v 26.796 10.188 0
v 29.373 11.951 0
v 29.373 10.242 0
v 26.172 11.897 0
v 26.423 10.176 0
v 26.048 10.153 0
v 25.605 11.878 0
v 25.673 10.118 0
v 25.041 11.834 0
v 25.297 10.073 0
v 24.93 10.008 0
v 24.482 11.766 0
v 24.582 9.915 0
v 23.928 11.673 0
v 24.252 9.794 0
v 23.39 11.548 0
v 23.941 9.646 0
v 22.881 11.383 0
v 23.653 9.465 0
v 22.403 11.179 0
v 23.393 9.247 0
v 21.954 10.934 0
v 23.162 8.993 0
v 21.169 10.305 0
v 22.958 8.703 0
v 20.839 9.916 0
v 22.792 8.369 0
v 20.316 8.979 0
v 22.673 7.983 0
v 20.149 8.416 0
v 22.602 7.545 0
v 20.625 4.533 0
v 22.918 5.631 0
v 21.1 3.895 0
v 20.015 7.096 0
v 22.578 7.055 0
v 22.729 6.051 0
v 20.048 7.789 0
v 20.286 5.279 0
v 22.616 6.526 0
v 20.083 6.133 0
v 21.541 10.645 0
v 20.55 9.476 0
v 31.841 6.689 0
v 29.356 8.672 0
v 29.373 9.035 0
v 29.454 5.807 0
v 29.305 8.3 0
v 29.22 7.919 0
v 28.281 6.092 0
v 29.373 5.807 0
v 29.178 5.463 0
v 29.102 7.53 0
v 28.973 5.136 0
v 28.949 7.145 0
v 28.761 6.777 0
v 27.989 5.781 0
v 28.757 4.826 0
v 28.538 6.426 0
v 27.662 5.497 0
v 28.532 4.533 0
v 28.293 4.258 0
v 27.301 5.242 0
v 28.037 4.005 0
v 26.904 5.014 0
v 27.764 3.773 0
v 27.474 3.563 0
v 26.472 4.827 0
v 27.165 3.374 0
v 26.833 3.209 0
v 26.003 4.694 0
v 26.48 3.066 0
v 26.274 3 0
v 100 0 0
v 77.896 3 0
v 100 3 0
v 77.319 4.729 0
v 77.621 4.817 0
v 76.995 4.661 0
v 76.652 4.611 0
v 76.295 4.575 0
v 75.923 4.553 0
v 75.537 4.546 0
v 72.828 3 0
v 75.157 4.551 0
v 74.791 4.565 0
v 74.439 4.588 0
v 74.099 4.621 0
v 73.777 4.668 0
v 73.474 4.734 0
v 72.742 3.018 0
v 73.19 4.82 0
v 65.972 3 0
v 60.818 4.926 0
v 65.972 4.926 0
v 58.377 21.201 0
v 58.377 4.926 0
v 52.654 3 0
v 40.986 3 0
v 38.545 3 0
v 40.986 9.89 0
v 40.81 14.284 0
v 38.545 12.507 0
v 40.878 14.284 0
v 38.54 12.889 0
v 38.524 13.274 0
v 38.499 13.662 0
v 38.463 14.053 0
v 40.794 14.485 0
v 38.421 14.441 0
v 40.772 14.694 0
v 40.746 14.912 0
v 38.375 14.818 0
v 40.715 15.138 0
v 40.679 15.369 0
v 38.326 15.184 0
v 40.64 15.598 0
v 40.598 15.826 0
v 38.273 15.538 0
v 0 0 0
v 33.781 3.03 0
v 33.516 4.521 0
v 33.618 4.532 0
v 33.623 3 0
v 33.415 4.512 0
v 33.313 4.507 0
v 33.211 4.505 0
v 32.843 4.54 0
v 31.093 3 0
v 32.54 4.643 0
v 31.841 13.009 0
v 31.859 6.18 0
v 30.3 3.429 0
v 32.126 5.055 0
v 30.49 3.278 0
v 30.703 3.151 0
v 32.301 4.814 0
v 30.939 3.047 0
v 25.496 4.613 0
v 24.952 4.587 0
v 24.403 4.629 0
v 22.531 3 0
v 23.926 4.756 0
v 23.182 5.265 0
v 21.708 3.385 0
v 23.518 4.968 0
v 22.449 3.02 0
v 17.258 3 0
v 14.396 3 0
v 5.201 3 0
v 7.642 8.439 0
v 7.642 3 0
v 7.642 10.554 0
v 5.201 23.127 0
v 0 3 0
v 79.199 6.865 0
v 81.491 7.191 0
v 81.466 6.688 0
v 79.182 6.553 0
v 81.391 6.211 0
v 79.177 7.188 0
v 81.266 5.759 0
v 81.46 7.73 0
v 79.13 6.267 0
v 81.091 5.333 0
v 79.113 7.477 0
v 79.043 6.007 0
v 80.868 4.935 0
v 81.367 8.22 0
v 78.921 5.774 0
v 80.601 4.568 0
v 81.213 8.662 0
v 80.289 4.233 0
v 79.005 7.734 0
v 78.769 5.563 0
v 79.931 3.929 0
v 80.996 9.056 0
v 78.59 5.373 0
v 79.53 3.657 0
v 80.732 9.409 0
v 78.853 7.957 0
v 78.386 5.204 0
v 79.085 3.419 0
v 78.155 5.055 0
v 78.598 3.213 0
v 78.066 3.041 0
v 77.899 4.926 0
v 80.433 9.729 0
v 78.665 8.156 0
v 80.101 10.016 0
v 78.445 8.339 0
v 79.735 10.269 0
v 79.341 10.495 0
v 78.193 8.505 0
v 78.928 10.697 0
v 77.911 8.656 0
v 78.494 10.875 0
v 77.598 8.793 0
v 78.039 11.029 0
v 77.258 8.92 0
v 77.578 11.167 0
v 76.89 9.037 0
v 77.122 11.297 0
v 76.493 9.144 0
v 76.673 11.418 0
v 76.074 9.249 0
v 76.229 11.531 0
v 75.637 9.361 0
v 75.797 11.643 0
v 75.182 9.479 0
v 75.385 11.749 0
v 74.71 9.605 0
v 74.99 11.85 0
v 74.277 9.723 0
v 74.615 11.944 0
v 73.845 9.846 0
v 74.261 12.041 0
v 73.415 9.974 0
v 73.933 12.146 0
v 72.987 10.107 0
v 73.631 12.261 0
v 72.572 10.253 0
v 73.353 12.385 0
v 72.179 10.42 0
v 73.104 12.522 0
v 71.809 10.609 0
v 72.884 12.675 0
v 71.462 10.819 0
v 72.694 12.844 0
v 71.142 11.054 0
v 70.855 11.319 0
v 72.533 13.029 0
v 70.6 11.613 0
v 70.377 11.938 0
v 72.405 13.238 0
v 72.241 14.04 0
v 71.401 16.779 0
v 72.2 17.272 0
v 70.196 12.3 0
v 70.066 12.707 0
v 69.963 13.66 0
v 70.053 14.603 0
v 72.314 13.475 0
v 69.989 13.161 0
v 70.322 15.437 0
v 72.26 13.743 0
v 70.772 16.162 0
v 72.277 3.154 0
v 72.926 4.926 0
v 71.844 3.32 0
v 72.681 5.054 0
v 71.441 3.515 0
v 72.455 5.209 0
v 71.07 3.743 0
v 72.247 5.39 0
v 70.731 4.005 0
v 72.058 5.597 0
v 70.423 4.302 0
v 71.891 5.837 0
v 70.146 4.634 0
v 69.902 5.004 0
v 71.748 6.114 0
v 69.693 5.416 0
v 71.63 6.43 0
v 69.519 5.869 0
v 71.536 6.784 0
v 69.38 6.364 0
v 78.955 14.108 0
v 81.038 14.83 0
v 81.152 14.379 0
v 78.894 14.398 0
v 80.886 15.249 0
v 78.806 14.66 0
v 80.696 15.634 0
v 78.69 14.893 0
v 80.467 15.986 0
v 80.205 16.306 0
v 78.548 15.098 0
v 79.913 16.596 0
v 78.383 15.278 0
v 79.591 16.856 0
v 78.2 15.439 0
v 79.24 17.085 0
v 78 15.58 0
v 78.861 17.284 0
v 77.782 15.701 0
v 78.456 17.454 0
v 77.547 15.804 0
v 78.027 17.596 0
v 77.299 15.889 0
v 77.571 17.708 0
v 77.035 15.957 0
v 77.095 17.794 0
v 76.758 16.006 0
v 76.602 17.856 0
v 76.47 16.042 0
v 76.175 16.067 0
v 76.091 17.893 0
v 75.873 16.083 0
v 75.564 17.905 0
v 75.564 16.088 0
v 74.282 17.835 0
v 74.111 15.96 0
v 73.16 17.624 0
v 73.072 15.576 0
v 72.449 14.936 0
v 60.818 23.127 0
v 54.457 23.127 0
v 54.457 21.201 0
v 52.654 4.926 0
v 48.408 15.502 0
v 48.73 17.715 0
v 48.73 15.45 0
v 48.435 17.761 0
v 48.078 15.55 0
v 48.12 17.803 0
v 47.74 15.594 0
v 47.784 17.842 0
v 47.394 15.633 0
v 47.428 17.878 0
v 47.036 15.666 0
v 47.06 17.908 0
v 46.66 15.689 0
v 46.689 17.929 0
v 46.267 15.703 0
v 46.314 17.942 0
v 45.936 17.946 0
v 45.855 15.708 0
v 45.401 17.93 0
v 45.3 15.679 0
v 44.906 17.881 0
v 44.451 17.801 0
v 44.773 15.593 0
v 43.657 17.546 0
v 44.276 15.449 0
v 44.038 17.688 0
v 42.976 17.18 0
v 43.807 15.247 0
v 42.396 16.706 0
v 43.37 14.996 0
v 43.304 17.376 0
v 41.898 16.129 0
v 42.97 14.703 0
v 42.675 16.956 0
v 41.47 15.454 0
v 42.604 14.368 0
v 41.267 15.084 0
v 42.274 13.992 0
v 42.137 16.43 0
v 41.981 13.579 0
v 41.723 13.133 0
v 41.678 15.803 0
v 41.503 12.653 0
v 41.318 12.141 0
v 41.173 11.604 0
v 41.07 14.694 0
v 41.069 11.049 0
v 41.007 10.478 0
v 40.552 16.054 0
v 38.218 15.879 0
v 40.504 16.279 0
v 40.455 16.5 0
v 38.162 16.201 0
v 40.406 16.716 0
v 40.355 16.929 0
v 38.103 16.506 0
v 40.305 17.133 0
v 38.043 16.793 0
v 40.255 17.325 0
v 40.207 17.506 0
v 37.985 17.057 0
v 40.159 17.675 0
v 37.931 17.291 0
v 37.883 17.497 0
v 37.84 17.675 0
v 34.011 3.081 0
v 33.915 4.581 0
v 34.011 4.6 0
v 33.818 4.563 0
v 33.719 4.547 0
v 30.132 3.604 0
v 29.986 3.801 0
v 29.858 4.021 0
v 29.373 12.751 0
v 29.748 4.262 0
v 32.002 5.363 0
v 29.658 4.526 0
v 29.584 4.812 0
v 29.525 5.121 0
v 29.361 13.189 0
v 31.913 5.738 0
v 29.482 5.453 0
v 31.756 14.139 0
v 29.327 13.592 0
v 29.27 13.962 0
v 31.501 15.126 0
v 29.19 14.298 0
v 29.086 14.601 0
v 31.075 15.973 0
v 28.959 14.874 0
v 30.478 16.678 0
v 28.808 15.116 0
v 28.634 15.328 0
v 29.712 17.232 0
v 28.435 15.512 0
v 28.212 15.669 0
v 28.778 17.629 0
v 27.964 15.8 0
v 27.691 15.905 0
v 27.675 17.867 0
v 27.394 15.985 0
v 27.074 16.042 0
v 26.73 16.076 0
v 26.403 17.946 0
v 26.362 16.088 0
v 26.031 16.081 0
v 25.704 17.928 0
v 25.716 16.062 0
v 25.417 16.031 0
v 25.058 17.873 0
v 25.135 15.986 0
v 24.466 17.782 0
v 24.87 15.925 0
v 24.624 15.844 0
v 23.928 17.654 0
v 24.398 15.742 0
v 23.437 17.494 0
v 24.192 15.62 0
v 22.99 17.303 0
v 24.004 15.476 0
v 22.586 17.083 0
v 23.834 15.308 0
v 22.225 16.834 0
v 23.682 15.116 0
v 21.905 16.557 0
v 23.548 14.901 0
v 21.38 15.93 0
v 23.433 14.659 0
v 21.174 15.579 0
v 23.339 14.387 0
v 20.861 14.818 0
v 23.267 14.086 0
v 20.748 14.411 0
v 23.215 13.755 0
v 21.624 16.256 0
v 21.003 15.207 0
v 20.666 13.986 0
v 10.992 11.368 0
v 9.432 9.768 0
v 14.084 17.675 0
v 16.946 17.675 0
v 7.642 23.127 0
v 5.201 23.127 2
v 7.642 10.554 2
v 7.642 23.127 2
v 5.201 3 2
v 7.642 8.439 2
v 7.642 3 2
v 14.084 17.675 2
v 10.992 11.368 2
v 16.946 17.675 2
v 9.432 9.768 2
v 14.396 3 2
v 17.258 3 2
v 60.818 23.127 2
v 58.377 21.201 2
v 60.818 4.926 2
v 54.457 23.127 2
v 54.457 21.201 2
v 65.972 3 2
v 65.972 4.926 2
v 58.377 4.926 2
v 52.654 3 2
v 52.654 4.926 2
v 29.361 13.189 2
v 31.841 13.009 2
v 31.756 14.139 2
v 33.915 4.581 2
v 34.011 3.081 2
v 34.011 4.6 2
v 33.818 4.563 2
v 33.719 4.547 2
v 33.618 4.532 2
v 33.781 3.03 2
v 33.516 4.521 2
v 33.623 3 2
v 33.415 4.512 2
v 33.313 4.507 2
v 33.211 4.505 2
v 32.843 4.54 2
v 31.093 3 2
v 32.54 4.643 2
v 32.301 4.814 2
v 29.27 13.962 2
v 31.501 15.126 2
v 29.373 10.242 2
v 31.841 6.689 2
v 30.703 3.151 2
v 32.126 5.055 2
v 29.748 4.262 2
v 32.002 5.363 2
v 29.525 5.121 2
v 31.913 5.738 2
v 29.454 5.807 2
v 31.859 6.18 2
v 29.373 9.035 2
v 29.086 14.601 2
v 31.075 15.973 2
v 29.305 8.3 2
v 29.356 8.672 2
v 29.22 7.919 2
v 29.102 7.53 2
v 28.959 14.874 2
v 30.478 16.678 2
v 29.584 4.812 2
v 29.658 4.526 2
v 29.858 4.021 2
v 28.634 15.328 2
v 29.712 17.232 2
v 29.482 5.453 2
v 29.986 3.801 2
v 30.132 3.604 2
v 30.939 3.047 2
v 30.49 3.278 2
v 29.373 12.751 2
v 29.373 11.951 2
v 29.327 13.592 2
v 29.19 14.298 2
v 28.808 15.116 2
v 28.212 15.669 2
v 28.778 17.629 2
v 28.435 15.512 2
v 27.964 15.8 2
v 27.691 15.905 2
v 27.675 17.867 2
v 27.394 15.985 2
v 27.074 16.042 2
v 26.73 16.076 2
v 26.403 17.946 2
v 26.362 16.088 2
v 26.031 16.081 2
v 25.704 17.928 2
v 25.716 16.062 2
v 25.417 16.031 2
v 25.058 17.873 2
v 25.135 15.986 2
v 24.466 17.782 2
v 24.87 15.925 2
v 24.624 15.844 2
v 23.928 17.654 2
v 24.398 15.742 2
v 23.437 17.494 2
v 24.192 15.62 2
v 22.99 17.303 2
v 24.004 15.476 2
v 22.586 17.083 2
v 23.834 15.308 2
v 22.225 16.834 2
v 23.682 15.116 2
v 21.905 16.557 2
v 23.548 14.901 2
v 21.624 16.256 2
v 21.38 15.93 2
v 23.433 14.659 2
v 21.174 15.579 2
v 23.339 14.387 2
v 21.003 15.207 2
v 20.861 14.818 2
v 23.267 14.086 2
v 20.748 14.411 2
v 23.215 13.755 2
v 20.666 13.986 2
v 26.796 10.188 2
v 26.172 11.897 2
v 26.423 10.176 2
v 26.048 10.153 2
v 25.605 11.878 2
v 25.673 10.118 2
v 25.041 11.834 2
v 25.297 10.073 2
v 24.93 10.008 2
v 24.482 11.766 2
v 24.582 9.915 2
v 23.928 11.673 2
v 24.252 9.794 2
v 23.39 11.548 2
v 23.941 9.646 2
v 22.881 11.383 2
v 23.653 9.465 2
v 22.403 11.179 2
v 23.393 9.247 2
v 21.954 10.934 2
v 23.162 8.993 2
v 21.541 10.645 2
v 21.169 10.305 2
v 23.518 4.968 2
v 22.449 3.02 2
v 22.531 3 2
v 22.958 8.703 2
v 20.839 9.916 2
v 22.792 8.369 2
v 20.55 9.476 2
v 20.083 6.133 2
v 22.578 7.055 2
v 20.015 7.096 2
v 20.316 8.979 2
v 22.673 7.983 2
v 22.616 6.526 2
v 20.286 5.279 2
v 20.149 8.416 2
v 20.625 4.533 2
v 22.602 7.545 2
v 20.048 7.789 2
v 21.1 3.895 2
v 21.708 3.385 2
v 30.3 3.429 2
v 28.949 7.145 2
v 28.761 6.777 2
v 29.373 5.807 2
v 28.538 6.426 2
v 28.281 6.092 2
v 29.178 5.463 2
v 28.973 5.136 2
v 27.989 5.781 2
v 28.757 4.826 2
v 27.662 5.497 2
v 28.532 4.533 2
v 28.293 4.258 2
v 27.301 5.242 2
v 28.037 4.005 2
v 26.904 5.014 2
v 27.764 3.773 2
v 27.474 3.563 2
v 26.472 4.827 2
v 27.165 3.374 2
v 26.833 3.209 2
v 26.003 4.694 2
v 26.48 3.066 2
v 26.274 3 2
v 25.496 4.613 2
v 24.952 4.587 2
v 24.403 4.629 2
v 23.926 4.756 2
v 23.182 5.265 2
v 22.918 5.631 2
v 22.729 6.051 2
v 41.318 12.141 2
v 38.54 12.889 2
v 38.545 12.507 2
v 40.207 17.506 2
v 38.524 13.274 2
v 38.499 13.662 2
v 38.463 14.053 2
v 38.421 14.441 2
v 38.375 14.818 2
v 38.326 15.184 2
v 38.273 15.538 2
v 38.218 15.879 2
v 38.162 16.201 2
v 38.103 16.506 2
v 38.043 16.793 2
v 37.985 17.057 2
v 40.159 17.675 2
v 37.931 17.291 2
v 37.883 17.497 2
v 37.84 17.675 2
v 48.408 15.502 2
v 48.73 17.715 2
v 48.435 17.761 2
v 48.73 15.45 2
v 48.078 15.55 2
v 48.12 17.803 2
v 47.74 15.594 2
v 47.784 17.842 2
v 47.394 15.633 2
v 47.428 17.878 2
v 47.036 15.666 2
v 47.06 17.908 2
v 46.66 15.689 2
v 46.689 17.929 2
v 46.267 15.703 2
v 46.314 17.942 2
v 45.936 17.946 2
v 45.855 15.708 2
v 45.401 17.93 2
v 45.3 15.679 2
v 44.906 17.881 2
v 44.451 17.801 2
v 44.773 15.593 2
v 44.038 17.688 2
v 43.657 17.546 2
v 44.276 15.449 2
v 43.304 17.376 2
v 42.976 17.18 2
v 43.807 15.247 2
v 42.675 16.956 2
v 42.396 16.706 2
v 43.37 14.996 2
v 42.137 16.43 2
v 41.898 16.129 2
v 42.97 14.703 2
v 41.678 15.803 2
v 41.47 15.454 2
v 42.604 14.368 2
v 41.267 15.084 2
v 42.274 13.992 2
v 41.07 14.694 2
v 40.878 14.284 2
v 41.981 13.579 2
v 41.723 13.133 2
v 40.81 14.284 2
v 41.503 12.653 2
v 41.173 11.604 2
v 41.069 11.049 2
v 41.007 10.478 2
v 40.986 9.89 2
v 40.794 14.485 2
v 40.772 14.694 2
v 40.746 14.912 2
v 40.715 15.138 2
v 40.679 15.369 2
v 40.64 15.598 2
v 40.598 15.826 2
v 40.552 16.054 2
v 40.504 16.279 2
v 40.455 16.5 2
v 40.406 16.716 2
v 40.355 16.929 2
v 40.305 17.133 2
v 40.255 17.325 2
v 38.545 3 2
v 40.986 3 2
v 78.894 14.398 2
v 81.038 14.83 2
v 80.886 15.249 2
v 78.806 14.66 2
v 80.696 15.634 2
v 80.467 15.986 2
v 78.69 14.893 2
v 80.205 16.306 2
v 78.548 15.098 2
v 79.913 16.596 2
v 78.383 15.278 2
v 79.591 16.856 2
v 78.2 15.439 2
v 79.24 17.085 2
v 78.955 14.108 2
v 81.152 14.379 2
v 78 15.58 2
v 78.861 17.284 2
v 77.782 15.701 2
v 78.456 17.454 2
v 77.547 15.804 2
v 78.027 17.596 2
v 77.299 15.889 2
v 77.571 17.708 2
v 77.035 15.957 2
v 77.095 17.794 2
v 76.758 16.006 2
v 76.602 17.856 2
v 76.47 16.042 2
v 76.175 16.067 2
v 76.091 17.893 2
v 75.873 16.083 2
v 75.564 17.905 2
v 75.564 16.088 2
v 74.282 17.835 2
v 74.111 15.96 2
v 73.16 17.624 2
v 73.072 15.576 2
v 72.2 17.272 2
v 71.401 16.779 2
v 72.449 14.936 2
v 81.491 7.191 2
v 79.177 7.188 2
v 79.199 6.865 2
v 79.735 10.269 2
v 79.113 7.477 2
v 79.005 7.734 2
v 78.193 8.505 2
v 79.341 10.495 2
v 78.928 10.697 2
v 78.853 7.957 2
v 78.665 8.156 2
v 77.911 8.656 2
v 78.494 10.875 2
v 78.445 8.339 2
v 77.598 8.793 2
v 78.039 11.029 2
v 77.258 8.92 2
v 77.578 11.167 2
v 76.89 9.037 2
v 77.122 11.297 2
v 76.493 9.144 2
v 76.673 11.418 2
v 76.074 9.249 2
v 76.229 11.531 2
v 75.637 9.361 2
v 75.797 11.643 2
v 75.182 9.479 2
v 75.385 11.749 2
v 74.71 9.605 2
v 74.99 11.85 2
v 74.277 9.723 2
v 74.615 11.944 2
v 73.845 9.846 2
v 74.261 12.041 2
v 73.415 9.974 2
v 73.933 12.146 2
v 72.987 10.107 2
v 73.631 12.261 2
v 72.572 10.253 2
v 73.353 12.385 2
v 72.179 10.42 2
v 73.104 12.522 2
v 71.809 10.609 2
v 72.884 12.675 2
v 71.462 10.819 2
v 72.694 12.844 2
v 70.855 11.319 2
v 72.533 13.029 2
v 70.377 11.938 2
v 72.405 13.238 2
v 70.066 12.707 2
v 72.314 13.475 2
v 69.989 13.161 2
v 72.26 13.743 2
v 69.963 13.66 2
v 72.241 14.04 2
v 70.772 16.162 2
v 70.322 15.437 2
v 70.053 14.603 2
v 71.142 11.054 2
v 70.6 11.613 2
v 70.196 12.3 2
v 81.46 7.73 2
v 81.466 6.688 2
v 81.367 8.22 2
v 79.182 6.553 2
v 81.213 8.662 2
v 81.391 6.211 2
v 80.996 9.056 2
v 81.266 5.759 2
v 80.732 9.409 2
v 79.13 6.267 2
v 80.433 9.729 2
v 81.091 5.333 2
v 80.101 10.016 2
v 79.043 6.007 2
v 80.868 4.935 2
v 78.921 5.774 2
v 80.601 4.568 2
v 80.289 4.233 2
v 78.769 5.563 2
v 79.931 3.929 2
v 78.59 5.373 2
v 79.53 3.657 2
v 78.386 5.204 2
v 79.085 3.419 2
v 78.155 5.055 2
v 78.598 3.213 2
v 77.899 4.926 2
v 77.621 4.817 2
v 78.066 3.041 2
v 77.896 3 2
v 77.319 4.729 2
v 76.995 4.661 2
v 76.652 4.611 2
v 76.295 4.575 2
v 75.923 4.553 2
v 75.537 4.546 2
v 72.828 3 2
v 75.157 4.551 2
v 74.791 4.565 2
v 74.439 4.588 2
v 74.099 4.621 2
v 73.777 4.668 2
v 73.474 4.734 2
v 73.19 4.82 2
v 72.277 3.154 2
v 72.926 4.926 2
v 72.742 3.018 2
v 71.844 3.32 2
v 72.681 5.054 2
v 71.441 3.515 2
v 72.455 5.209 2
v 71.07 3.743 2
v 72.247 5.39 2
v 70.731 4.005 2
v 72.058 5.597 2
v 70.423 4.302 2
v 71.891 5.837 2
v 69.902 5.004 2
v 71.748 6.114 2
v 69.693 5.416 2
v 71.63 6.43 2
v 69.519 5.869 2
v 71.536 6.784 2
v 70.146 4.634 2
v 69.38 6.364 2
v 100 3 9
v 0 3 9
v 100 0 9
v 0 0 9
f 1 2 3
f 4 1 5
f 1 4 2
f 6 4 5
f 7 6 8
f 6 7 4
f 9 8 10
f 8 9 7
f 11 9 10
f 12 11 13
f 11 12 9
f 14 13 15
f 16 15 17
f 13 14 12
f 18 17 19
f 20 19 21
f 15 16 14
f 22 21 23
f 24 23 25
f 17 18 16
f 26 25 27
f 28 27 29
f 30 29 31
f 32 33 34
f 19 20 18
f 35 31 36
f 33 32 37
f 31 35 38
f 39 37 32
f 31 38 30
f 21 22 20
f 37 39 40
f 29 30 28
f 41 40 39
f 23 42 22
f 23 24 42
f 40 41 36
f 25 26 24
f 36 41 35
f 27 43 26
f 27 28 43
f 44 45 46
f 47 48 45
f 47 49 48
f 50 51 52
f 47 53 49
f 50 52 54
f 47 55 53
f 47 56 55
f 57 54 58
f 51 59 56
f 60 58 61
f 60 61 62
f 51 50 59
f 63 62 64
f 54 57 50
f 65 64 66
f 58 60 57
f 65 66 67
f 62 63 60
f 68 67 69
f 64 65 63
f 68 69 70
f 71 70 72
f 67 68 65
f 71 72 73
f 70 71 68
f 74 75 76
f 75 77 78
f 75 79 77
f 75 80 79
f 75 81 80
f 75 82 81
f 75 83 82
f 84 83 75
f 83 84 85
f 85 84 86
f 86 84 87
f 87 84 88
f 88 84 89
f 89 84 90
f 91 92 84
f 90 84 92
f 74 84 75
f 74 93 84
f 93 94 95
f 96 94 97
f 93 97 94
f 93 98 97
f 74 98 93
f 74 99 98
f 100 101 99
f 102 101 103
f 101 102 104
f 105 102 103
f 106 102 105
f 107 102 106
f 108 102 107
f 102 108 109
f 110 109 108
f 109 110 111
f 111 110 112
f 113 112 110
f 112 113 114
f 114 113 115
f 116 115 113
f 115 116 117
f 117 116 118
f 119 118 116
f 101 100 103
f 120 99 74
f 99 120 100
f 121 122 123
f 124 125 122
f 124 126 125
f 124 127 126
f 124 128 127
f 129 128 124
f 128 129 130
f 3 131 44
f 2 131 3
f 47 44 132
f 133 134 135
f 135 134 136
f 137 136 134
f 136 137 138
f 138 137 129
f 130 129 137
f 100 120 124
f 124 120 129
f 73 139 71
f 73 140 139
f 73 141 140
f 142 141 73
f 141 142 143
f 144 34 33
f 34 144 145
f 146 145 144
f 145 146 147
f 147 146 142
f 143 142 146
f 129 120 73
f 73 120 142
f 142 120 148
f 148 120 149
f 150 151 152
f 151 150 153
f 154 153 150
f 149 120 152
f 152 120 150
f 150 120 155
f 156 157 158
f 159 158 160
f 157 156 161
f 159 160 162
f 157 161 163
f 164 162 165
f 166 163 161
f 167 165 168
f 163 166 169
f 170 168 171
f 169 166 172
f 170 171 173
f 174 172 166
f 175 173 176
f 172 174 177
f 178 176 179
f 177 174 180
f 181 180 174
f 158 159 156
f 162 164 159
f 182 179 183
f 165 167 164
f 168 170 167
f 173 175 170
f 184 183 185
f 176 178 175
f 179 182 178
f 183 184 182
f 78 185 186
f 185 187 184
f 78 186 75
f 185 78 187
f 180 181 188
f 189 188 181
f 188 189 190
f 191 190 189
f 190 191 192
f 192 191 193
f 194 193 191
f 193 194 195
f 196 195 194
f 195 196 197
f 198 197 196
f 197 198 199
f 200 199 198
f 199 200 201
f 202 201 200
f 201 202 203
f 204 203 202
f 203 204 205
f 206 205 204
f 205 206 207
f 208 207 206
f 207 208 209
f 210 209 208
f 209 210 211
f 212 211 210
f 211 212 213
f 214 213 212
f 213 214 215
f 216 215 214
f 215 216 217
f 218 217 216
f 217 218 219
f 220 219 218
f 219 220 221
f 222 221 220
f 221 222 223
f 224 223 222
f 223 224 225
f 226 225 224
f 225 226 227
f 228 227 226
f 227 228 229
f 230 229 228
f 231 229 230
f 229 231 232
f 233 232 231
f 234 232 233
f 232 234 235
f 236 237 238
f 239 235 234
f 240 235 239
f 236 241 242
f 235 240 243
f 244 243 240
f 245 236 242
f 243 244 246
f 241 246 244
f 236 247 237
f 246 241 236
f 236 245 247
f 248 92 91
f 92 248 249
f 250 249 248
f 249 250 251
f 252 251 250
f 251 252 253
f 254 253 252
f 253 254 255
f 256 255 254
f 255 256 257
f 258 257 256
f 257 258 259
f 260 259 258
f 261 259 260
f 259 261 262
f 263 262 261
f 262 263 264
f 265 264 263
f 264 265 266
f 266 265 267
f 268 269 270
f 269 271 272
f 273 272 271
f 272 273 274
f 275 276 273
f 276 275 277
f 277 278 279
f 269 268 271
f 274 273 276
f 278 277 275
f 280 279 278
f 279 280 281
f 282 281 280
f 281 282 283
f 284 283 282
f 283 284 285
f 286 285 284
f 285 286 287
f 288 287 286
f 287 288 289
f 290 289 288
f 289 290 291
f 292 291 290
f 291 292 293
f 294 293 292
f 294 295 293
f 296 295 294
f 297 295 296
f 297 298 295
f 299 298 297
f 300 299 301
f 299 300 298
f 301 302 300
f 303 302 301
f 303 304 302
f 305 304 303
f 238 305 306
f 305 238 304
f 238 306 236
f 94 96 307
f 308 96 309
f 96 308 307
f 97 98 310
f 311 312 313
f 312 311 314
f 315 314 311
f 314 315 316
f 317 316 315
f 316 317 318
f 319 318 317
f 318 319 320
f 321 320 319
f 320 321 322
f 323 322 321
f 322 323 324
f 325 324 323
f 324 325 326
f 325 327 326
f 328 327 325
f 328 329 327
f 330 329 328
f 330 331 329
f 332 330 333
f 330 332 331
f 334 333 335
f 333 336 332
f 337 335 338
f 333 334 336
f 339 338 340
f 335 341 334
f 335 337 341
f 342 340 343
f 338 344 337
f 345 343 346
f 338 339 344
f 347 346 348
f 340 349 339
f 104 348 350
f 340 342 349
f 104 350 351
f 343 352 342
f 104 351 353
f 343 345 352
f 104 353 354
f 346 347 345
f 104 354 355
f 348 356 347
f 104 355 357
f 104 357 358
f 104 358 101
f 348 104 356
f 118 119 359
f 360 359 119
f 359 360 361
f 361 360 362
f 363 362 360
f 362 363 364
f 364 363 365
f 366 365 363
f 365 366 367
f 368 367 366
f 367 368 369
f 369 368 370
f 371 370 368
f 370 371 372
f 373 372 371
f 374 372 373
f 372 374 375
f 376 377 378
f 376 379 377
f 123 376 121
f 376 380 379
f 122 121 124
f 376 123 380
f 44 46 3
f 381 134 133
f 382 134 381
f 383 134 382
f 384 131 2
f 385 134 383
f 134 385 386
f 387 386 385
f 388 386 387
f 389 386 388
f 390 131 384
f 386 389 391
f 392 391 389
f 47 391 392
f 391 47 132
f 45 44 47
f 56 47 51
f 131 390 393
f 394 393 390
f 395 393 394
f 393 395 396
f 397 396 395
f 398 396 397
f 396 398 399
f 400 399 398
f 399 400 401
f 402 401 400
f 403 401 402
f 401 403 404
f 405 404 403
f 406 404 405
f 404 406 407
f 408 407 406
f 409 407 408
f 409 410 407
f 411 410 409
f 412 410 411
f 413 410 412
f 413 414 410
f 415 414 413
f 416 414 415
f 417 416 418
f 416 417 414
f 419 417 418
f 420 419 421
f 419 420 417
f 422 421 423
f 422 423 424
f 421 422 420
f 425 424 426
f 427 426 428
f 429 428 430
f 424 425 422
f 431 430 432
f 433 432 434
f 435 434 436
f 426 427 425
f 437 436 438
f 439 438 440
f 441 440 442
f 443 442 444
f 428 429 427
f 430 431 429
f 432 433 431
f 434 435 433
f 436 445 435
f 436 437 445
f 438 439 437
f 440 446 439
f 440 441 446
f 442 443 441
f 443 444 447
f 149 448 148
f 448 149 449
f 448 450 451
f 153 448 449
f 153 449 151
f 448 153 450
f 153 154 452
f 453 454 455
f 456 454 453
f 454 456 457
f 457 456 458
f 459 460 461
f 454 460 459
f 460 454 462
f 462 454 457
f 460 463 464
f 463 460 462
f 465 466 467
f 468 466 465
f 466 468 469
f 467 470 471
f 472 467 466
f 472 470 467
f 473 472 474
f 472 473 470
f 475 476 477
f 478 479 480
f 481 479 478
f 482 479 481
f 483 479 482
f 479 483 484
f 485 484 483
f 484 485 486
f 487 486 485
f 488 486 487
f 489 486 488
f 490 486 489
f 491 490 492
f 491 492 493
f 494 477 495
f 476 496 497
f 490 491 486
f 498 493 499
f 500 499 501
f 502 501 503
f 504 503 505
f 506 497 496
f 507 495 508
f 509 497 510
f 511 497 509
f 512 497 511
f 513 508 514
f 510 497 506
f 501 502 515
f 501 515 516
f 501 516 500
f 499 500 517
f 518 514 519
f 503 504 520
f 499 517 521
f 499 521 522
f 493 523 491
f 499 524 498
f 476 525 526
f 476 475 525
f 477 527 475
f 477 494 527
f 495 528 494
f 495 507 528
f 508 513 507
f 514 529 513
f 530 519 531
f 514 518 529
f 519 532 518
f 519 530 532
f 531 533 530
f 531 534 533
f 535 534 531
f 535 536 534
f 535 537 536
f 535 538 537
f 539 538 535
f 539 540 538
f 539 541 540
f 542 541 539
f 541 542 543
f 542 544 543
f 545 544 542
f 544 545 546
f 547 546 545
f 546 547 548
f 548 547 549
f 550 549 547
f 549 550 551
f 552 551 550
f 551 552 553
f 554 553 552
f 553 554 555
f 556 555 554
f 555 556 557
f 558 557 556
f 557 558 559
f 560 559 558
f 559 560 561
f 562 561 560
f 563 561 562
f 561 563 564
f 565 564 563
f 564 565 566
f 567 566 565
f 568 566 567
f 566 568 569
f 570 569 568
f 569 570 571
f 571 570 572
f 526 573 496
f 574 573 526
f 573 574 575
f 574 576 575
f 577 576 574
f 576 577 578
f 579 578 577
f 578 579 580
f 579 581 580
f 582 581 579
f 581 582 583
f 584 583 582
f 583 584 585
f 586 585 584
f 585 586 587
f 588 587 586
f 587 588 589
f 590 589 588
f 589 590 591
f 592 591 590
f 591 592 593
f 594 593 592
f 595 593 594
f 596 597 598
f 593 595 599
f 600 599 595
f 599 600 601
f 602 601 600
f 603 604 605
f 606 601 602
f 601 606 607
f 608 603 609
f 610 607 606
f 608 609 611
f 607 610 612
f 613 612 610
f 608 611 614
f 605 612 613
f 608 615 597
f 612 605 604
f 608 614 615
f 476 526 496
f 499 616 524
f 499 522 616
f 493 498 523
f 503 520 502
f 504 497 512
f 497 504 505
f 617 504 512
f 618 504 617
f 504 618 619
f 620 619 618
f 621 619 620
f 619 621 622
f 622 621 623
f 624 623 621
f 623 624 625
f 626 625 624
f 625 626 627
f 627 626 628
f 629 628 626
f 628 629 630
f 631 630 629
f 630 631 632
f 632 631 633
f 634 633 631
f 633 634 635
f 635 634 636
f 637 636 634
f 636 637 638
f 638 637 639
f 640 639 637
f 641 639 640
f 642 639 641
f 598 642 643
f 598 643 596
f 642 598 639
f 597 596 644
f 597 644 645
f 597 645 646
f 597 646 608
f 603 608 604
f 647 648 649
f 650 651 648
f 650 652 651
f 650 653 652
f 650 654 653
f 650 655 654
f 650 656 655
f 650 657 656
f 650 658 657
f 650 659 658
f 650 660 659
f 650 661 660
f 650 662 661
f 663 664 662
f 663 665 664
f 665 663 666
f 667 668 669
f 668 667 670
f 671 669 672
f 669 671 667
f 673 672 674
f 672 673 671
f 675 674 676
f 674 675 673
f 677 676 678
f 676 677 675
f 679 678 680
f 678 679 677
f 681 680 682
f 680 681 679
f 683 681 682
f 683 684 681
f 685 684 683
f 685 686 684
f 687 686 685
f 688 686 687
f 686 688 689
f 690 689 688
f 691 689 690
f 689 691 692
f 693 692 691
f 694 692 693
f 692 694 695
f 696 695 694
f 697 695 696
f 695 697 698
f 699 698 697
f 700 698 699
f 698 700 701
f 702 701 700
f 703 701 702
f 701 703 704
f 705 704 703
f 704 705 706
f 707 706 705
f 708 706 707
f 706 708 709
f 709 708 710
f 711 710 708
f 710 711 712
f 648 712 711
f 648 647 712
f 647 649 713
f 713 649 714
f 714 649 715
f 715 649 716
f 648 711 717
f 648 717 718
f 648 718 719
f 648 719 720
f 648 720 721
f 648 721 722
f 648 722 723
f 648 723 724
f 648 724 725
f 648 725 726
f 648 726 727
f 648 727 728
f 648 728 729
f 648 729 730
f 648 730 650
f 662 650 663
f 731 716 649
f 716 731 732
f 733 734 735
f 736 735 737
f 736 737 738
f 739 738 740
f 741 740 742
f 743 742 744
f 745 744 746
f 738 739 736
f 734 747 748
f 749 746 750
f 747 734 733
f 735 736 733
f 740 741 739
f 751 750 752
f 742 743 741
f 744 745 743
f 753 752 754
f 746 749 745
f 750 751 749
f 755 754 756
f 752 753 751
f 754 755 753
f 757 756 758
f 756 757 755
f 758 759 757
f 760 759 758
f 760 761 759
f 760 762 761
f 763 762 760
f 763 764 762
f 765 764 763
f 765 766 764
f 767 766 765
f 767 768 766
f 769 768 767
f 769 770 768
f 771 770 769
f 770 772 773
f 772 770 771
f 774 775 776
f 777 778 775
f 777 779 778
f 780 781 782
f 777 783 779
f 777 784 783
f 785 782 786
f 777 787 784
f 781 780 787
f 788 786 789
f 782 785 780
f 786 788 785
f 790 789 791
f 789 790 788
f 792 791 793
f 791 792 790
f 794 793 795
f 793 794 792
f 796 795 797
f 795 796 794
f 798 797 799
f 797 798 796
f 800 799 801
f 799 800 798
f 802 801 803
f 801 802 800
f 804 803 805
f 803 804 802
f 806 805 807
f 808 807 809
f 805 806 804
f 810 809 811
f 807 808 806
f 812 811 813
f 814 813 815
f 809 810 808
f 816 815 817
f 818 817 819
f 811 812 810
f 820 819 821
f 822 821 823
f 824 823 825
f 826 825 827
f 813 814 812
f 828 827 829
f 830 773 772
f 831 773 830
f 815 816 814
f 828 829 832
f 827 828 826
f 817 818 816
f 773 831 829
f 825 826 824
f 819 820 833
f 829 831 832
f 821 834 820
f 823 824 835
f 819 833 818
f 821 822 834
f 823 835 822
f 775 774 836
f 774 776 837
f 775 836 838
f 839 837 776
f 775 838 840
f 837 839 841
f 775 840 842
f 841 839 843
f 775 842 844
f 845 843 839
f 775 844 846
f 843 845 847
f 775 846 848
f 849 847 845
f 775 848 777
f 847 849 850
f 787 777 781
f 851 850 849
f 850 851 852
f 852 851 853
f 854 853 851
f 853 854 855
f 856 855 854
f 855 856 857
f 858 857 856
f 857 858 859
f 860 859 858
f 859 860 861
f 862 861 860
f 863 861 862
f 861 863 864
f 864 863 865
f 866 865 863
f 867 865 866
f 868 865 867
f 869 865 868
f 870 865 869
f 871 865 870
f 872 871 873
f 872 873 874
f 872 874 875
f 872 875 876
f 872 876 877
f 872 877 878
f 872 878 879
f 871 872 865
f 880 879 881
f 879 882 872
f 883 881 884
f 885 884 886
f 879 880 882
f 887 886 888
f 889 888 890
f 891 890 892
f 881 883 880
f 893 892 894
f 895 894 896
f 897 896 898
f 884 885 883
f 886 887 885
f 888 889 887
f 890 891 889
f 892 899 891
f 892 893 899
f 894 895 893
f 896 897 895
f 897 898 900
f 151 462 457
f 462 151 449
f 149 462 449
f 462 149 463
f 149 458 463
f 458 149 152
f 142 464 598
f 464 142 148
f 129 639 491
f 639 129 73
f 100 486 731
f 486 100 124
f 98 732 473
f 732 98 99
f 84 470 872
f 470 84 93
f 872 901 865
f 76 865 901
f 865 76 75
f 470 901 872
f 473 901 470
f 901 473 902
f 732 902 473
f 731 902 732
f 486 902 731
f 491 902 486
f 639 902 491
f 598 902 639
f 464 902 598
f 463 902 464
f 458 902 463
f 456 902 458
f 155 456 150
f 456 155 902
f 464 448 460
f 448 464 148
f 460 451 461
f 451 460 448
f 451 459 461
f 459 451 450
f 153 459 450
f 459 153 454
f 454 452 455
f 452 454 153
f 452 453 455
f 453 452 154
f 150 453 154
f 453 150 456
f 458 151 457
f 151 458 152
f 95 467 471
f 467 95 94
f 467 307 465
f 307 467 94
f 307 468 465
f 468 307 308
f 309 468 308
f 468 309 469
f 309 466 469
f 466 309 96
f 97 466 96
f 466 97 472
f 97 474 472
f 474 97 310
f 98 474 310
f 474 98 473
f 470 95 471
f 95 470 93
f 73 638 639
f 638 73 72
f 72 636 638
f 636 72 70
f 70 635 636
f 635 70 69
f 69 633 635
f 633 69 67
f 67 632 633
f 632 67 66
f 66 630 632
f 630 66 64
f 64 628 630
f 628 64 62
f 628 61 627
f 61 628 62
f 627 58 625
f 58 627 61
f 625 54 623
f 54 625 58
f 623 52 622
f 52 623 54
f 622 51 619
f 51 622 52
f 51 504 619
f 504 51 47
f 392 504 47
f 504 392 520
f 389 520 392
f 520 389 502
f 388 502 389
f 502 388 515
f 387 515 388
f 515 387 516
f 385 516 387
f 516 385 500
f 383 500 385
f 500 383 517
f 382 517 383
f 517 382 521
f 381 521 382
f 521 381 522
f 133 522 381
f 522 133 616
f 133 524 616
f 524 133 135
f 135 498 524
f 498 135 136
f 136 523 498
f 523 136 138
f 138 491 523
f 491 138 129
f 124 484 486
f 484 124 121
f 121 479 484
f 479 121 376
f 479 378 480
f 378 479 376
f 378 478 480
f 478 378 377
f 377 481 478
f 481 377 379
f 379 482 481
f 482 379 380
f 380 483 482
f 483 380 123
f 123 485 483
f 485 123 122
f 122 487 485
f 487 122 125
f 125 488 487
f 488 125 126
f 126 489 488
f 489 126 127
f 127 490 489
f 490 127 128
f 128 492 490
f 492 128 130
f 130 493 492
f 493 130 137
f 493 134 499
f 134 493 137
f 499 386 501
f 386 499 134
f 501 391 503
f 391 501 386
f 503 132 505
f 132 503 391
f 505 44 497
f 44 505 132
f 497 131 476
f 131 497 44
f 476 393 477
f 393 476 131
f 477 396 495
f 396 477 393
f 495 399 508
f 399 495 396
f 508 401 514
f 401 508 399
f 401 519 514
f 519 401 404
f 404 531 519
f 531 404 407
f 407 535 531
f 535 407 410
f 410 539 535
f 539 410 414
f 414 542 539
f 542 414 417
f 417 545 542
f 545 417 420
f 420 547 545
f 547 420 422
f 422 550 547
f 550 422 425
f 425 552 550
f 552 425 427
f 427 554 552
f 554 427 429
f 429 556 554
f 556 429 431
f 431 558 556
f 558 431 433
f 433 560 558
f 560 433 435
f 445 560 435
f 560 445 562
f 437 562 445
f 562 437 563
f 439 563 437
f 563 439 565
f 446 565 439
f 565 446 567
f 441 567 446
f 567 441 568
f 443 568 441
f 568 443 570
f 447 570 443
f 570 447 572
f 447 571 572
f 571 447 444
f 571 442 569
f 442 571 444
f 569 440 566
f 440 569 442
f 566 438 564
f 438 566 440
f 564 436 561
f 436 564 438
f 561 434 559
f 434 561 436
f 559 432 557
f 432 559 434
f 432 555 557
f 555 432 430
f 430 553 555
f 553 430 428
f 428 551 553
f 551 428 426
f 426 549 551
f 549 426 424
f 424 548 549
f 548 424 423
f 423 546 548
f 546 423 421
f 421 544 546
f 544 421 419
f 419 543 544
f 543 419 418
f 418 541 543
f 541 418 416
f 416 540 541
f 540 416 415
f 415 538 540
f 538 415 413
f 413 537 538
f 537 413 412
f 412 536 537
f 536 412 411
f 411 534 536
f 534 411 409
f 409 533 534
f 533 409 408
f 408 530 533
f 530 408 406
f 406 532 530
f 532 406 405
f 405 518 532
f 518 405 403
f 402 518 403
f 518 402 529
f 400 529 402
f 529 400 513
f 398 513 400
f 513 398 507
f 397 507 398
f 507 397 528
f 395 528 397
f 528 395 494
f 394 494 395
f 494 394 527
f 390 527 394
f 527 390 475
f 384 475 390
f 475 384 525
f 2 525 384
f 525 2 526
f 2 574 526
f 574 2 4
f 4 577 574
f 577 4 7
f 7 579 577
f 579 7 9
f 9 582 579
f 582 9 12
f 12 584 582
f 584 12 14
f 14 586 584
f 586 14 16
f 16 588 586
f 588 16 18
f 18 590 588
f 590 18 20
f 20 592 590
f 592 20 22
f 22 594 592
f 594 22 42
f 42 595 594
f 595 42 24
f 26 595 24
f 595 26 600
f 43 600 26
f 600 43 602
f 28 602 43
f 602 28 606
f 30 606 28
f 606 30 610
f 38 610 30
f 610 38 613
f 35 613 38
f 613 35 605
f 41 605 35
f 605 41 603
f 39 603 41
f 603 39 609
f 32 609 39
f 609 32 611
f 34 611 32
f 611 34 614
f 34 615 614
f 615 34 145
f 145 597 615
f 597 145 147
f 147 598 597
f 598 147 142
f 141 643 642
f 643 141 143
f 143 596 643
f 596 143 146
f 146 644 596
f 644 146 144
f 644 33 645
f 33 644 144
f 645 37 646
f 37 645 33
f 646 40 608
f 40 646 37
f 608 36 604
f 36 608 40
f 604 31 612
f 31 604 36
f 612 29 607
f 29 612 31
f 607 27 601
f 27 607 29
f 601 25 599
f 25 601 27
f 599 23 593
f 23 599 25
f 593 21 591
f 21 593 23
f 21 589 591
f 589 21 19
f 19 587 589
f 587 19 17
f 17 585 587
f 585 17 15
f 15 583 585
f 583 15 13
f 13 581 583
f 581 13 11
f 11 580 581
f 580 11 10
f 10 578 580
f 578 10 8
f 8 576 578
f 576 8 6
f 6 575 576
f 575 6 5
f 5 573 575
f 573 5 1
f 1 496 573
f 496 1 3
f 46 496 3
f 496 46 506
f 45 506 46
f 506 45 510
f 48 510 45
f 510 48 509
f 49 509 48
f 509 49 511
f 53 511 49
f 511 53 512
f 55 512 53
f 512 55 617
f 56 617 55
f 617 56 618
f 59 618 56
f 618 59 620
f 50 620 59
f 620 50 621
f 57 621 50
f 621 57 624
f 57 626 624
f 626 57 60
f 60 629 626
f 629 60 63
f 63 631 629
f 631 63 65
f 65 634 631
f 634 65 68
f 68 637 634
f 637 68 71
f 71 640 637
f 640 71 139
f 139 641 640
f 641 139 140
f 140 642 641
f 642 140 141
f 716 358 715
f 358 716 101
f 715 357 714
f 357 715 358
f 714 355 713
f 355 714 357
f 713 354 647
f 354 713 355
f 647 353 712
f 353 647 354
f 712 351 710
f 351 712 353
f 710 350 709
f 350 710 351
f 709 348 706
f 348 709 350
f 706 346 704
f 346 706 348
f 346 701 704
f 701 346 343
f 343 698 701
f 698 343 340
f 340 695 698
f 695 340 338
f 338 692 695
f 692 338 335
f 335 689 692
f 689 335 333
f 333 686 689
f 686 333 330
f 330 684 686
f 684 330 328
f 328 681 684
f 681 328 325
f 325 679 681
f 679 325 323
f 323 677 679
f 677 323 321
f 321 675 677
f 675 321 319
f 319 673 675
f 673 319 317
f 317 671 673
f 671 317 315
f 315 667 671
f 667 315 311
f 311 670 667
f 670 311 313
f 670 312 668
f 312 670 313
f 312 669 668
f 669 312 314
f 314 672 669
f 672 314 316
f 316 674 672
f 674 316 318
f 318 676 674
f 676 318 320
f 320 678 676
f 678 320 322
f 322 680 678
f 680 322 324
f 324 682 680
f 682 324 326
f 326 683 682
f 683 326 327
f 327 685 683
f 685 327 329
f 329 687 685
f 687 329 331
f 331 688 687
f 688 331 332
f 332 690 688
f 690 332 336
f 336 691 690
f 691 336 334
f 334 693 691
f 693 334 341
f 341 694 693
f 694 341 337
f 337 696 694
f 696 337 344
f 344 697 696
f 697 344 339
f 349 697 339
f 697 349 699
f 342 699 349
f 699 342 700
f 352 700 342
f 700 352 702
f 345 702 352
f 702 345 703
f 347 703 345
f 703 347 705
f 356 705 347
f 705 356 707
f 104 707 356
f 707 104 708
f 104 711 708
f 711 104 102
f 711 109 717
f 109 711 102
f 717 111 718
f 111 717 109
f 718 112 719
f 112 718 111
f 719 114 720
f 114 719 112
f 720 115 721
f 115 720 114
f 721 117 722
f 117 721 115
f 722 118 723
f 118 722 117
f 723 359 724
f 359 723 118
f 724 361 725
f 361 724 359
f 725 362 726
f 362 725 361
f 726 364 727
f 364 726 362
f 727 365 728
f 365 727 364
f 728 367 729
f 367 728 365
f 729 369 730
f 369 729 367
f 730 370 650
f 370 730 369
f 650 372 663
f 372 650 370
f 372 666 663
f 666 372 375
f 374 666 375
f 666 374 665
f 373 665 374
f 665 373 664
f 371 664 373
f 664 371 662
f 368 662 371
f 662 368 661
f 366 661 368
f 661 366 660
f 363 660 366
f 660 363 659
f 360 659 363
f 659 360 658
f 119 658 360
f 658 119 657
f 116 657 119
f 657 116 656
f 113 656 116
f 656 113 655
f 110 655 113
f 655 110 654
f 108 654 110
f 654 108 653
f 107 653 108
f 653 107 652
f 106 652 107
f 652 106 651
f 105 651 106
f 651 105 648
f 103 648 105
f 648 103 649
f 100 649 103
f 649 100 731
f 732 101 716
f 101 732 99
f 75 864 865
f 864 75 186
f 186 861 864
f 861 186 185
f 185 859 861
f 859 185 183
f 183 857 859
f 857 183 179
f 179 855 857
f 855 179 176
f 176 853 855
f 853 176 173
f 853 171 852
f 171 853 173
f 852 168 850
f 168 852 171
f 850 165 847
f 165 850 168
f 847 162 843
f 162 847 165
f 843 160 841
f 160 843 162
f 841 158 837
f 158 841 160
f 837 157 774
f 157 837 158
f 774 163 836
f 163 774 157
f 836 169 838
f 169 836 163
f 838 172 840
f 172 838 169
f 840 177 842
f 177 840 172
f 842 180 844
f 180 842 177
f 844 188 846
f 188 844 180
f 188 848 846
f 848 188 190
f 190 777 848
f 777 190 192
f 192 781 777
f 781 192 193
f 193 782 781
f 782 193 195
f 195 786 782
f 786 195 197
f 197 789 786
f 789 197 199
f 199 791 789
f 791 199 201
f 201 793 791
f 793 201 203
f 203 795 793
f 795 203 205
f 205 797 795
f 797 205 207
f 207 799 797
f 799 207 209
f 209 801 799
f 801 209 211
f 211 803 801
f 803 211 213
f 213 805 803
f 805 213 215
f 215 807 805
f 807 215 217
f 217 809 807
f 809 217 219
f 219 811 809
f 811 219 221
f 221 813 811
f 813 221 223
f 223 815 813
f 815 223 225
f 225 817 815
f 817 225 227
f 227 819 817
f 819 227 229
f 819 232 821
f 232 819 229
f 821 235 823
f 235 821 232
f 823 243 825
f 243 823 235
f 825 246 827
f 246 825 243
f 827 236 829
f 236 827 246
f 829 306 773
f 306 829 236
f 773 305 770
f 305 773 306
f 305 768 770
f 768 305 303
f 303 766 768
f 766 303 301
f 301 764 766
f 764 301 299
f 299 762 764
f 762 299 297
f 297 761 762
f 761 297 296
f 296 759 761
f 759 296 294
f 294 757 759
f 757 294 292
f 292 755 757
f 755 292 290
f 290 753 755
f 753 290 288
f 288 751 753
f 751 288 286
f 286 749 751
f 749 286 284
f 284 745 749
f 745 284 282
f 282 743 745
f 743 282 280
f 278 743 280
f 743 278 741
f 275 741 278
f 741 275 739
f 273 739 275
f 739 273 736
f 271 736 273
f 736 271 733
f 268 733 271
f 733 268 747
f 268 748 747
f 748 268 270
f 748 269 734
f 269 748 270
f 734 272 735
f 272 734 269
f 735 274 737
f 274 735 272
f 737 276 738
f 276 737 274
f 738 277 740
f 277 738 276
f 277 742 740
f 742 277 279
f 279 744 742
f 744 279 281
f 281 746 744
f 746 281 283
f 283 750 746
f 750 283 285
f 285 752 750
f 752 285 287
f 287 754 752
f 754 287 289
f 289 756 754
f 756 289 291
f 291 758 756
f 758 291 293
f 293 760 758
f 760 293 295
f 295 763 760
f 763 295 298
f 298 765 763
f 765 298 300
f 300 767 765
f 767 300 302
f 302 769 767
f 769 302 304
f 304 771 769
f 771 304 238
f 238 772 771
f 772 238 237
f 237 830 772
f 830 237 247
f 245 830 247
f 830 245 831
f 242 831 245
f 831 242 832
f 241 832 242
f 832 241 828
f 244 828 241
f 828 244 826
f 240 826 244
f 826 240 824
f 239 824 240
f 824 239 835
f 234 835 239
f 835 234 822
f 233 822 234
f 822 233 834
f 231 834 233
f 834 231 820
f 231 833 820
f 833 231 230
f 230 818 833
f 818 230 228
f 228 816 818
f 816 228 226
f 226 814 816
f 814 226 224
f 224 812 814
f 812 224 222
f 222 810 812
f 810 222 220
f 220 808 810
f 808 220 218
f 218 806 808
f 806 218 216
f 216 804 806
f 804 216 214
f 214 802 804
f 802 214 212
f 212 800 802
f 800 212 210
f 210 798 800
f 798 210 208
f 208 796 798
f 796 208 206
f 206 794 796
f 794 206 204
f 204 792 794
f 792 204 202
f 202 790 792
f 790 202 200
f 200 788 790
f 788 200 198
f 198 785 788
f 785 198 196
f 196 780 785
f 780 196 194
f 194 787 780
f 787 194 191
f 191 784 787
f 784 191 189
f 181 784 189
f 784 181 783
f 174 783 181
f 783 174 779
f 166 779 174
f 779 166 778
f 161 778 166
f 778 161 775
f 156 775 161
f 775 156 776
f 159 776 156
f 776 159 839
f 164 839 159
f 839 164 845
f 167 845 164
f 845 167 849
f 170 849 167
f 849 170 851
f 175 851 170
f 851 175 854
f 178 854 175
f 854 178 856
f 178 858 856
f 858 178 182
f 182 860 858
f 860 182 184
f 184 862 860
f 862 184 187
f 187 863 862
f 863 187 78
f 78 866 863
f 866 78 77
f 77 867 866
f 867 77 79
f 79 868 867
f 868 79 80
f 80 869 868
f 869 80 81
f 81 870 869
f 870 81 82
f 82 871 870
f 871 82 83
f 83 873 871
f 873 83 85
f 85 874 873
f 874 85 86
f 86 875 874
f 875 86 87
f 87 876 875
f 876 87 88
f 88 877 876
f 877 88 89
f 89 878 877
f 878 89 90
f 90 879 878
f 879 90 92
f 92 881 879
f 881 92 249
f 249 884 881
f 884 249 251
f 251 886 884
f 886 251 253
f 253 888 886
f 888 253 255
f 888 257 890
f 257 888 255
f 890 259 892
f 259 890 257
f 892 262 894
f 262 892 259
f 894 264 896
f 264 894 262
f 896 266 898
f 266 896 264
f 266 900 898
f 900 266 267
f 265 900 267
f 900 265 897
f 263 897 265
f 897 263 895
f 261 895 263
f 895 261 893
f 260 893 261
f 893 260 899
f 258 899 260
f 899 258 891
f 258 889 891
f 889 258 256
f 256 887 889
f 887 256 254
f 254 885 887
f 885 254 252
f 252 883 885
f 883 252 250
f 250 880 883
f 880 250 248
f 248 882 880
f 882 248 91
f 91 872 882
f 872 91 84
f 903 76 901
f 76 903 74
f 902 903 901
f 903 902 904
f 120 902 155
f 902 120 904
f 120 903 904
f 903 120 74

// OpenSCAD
translate([2, 3, 0])
linear_extrude(height=2)
    text("karls", 20, "Courier");

cube([100, 3, 9]);
